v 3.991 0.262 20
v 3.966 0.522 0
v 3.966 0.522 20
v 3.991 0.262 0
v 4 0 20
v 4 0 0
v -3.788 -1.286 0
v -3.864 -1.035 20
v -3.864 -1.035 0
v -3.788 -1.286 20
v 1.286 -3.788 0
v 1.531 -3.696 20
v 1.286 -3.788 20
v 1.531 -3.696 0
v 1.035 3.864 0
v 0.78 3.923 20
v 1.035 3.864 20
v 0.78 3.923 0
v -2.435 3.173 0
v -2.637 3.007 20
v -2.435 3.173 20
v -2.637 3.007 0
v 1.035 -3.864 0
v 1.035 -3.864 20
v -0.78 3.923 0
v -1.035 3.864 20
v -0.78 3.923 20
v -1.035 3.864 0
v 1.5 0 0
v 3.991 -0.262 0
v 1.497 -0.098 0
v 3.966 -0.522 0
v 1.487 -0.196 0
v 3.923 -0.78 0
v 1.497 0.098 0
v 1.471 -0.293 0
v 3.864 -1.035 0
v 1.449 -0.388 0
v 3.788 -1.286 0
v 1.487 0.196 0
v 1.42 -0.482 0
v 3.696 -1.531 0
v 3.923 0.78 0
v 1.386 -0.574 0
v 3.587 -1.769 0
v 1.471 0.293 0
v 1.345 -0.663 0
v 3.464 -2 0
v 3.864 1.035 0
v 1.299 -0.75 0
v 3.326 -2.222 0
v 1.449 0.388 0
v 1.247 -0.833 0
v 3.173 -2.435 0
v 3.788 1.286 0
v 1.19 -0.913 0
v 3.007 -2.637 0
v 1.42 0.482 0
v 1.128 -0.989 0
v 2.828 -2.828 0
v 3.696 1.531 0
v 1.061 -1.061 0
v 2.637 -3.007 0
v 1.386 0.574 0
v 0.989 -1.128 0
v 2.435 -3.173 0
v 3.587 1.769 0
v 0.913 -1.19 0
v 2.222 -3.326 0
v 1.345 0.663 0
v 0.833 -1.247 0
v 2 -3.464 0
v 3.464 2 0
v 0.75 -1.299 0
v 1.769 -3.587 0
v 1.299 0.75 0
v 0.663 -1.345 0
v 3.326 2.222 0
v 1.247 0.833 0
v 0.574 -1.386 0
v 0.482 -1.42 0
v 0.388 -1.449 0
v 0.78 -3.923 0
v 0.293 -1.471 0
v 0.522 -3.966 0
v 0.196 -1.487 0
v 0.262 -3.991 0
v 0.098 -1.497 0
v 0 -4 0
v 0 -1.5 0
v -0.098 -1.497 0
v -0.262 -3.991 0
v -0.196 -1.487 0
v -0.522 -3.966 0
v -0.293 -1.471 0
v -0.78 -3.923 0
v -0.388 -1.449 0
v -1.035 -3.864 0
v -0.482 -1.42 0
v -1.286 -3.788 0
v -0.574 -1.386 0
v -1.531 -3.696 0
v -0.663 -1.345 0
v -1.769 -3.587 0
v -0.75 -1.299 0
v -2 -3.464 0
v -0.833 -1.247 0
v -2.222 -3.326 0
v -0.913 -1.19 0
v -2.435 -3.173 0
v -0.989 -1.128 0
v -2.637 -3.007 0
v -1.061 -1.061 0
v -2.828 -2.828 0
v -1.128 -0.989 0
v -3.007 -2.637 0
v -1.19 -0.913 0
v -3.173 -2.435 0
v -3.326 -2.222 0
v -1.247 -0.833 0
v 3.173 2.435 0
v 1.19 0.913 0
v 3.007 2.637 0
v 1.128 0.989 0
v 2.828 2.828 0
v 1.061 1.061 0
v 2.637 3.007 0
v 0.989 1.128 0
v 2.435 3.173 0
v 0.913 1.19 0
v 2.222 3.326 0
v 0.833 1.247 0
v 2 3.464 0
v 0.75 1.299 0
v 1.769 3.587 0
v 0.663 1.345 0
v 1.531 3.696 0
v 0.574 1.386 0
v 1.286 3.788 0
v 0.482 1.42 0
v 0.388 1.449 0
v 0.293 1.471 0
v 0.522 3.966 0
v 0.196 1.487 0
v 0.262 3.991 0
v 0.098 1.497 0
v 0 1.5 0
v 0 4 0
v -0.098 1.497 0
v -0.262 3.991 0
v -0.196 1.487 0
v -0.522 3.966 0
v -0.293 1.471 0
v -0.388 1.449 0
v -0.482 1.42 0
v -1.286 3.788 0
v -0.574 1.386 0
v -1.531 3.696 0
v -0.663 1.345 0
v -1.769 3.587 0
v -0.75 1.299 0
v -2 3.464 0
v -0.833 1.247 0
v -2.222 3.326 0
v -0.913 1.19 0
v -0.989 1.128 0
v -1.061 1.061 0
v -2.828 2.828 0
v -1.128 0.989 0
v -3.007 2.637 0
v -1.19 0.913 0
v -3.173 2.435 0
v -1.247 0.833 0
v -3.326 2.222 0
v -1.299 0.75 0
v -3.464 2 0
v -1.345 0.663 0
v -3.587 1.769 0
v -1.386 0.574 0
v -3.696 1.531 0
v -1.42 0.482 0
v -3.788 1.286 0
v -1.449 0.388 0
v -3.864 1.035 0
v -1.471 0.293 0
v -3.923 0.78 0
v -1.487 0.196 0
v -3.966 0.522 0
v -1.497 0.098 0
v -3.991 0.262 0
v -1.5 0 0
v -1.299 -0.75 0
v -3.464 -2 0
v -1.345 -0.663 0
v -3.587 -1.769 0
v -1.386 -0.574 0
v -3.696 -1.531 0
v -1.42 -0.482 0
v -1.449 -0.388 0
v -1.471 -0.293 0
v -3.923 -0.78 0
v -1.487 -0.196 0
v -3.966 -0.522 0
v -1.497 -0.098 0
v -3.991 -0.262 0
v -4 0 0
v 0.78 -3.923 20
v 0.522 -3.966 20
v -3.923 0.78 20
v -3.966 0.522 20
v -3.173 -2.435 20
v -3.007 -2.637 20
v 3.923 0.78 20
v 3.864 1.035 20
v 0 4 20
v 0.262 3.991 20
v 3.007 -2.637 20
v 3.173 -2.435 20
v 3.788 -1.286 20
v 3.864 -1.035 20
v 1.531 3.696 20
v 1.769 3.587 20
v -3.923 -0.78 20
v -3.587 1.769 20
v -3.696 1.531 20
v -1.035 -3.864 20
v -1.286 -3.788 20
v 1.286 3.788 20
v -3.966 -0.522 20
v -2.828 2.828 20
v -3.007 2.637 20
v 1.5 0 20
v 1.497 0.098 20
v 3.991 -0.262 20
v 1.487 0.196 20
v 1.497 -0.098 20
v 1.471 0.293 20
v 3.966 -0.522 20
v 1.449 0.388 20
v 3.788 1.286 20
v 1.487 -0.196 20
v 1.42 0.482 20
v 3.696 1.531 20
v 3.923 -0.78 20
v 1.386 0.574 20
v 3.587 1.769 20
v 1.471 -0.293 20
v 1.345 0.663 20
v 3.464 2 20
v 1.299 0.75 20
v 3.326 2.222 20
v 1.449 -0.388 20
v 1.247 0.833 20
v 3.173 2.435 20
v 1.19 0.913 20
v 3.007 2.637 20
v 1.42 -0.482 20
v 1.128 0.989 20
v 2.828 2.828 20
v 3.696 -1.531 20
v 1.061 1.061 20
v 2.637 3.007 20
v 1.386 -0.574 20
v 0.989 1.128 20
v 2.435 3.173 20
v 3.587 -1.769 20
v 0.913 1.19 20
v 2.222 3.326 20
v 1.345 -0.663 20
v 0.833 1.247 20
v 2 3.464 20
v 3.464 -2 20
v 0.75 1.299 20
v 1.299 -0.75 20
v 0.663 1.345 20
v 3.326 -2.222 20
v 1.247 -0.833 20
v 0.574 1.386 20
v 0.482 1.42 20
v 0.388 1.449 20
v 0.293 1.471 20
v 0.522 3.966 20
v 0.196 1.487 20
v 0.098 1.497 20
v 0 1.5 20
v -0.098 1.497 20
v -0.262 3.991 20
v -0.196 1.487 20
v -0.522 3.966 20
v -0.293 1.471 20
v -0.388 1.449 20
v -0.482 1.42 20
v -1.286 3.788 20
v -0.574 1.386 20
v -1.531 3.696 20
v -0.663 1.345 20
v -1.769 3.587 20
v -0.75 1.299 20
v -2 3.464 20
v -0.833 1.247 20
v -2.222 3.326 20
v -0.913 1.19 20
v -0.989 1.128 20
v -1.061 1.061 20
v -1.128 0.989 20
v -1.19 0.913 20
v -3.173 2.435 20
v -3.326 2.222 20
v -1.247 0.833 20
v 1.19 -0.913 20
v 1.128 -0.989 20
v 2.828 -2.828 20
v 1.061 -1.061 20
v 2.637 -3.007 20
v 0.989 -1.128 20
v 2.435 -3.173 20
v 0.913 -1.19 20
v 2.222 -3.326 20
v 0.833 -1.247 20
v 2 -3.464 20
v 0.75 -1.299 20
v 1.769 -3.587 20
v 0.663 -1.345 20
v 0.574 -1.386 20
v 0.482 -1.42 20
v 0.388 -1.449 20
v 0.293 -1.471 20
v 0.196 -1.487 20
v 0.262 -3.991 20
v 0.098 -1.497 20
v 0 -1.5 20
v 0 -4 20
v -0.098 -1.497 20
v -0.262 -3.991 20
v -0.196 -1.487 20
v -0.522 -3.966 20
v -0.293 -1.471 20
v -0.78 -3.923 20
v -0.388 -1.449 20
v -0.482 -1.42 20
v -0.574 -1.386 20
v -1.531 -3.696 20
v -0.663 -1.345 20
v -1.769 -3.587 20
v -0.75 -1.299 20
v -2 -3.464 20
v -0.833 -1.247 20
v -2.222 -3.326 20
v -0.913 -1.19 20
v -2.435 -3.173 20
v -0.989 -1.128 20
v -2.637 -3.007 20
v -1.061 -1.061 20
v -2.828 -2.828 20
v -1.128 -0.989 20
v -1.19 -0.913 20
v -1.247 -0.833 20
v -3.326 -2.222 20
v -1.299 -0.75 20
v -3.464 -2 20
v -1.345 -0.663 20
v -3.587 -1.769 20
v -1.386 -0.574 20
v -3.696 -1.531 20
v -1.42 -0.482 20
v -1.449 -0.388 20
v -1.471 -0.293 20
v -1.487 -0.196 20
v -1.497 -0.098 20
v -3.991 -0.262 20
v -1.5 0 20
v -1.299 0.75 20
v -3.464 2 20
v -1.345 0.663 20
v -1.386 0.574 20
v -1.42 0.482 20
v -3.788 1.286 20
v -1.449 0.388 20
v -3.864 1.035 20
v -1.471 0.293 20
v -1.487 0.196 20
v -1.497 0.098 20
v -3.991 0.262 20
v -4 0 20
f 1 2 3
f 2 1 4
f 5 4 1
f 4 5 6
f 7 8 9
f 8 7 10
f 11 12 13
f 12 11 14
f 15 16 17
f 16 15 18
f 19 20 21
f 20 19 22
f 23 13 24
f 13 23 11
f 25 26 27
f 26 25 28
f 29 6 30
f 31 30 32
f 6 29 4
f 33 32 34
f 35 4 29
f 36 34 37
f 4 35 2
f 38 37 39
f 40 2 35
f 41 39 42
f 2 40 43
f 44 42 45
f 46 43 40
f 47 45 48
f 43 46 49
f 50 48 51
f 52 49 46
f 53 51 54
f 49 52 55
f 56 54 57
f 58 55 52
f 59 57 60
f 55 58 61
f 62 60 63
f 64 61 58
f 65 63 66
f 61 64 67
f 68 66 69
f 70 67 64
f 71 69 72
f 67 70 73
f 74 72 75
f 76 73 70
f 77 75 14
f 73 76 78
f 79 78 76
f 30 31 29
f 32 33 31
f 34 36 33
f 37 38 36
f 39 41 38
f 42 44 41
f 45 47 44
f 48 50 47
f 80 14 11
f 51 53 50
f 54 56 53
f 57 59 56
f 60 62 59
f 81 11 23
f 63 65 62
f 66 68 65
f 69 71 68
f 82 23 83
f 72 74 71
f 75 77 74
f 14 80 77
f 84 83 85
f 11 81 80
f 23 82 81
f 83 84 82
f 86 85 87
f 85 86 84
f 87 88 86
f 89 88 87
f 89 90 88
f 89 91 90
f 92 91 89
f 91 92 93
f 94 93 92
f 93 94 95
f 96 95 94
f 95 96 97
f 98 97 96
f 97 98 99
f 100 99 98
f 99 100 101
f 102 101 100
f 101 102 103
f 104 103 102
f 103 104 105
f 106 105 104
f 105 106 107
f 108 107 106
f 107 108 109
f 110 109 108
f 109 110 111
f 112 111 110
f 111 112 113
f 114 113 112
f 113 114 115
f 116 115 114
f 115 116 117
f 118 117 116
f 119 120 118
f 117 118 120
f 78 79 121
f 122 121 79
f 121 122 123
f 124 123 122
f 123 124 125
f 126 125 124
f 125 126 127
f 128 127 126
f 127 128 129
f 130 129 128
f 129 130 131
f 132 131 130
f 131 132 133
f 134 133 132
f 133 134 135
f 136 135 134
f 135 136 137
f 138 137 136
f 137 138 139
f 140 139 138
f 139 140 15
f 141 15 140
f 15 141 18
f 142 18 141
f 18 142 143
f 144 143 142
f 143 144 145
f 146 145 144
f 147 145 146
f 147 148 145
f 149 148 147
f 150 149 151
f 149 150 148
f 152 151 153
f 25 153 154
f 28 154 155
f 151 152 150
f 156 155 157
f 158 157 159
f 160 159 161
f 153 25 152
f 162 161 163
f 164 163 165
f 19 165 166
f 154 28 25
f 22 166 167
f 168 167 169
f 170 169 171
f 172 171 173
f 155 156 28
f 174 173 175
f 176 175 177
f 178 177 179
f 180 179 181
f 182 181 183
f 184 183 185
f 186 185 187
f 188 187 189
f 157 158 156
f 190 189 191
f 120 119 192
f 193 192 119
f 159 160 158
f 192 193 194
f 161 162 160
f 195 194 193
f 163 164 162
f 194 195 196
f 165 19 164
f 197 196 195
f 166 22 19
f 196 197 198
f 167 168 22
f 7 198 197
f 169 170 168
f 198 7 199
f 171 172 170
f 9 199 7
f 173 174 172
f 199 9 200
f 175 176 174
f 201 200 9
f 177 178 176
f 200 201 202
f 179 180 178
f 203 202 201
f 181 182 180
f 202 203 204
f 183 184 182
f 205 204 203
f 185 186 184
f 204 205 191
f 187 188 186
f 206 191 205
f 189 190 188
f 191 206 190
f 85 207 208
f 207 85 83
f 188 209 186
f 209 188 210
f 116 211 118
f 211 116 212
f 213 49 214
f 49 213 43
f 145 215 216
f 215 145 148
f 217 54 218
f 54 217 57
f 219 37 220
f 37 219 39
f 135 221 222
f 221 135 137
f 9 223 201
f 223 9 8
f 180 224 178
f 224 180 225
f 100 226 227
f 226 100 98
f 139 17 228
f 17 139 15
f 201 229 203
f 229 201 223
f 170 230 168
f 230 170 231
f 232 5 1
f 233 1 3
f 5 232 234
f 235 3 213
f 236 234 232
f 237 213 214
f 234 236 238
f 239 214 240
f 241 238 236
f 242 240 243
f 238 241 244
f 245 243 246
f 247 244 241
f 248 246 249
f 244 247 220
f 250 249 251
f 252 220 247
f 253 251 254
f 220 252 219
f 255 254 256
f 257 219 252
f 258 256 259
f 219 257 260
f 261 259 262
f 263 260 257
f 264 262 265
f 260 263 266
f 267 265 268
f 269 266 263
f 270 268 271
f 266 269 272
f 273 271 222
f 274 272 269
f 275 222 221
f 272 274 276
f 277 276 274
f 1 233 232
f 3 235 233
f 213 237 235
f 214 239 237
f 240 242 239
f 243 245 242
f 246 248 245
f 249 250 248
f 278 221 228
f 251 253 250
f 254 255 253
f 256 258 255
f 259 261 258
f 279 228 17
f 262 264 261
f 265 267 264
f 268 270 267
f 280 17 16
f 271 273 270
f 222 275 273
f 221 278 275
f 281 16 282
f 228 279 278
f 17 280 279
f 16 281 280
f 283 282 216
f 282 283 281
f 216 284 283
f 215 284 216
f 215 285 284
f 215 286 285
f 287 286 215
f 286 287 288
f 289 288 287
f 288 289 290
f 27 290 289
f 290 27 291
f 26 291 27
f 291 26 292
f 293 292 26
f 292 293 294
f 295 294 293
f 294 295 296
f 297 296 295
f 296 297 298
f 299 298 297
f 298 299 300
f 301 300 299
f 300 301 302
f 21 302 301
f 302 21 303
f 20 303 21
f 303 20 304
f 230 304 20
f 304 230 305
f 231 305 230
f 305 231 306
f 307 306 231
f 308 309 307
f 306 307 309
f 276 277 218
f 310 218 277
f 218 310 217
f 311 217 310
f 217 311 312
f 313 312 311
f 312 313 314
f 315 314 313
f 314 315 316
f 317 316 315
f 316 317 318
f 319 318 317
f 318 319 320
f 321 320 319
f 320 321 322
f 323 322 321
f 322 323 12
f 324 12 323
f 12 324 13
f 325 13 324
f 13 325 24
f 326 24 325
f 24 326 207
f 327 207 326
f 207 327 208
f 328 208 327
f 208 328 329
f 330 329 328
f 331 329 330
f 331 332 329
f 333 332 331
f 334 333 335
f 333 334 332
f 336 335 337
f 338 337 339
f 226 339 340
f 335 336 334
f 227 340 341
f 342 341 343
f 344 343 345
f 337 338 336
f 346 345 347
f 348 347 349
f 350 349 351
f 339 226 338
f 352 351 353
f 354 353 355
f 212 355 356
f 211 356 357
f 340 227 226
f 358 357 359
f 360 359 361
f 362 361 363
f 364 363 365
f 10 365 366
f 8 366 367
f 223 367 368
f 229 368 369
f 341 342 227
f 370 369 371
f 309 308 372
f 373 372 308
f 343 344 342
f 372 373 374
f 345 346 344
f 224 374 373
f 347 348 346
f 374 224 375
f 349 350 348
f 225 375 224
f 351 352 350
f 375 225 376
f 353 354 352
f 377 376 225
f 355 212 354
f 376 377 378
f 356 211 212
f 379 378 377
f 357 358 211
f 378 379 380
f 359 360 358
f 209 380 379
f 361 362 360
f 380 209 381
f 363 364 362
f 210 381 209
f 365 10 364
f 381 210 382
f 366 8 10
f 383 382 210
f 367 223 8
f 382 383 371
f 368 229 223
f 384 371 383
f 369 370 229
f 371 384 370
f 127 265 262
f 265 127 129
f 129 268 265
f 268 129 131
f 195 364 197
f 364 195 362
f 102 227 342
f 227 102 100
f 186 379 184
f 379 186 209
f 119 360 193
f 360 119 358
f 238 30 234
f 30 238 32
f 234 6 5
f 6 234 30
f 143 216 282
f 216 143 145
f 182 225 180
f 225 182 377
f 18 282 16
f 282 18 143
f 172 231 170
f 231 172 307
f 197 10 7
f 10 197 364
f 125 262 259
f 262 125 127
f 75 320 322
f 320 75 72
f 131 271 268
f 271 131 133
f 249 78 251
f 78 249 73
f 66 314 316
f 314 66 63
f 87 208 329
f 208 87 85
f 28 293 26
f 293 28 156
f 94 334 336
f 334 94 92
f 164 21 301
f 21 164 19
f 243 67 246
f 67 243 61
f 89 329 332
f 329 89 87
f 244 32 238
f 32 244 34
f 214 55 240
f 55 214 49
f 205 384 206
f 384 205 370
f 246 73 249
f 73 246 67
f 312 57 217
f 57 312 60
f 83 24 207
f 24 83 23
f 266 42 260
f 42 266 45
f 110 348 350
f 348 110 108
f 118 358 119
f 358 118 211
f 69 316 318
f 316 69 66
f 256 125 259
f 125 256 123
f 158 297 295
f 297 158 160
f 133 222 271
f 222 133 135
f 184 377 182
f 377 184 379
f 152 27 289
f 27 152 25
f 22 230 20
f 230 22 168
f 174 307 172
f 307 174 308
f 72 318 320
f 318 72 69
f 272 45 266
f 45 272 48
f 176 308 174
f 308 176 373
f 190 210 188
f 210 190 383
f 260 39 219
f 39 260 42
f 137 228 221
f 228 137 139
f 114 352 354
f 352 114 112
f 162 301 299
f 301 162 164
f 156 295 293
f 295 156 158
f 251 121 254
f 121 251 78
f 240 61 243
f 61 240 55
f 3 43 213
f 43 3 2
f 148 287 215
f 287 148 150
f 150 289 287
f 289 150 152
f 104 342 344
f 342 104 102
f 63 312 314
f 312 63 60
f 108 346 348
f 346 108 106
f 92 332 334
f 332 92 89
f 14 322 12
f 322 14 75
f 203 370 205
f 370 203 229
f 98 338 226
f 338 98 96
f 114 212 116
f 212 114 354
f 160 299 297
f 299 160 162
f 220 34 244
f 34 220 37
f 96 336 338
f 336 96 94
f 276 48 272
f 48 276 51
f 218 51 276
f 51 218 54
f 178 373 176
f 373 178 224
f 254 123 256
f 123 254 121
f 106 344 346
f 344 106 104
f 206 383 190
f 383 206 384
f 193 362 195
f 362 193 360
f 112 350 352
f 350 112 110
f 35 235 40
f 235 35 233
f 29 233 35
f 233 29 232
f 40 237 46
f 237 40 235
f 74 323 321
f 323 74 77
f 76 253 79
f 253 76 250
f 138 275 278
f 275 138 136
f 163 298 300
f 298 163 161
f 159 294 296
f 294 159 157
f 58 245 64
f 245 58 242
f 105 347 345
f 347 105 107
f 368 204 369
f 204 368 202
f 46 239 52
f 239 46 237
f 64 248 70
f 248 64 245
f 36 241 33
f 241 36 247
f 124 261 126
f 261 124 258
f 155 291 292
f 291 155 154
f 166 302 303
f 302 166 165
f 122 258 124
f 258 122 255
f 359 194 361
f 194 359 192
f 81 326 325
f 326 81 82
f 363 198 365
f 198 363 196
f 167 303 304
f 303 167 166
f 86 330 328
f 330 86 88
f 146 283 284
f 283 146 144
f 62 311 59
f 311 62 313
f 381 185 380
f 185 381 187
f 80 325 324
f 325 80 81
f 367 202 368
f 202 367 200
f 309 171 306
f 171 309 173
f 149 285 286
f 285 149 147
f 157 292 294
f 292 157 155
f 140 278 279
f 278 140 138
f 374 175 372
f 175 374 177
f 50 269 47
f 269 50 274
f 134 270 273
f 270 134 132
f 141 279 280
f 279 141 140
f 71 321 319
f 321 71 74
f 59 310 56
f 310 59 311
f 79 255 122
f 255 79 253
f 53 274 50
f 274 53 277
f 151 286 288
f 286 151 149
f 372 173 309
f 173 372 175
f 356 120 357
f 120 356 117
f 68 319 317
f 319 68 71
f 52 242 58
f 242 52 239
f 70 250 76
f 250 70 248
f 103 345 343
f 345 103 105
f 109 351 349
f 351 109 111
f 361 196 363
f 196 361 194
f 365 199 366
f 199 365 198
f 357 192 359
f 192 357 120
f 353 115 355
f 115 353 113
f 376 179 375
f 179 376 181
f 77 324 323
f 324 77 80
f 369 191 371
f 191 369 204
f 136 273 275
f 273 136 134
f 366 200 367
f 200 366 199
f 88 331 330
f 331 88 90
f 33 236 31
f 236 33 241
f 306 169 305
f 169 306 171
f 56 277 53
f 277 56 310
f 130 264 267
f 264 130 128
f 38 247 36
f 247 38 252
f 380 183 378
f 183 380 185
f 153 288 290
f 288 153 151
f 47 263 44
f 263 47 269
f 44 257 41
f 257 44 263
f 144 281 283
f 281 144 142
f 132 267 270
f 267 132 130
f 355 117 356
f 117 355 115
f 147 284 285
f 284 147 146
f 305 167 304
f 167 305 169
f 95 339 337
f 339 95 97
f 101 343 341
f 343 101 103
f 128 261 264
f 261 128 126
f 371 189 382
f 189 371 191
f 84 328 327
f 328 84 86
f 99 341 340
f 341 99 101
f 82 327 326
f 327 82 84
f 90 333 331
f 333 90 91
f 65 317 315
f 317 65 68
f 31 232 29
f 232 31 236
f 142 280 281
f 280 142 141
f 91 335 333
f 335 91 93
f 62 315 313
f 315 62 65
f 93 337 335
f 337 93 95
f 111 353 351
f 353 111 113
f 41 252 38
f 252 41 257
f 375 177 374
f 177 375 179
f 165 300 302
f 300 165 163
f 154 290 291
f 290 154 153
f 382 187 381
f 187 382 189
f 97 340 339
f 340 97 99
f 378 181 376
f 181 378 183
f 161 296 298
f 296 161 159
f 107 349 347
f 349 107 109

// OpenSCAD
$fn = 96;

thread_d = 3.0;      // nominal thread diameter (mm)
length   = 20.0;     // overall length (mm)
outer_d  = 8.0;      // standoff outer diameter (mm)

difference() {
  cylinder(h = length, d = outer_d);
  translate([0,0,-0.2])
    cylinder(h = length + 0.4, d = thread_d);
}
